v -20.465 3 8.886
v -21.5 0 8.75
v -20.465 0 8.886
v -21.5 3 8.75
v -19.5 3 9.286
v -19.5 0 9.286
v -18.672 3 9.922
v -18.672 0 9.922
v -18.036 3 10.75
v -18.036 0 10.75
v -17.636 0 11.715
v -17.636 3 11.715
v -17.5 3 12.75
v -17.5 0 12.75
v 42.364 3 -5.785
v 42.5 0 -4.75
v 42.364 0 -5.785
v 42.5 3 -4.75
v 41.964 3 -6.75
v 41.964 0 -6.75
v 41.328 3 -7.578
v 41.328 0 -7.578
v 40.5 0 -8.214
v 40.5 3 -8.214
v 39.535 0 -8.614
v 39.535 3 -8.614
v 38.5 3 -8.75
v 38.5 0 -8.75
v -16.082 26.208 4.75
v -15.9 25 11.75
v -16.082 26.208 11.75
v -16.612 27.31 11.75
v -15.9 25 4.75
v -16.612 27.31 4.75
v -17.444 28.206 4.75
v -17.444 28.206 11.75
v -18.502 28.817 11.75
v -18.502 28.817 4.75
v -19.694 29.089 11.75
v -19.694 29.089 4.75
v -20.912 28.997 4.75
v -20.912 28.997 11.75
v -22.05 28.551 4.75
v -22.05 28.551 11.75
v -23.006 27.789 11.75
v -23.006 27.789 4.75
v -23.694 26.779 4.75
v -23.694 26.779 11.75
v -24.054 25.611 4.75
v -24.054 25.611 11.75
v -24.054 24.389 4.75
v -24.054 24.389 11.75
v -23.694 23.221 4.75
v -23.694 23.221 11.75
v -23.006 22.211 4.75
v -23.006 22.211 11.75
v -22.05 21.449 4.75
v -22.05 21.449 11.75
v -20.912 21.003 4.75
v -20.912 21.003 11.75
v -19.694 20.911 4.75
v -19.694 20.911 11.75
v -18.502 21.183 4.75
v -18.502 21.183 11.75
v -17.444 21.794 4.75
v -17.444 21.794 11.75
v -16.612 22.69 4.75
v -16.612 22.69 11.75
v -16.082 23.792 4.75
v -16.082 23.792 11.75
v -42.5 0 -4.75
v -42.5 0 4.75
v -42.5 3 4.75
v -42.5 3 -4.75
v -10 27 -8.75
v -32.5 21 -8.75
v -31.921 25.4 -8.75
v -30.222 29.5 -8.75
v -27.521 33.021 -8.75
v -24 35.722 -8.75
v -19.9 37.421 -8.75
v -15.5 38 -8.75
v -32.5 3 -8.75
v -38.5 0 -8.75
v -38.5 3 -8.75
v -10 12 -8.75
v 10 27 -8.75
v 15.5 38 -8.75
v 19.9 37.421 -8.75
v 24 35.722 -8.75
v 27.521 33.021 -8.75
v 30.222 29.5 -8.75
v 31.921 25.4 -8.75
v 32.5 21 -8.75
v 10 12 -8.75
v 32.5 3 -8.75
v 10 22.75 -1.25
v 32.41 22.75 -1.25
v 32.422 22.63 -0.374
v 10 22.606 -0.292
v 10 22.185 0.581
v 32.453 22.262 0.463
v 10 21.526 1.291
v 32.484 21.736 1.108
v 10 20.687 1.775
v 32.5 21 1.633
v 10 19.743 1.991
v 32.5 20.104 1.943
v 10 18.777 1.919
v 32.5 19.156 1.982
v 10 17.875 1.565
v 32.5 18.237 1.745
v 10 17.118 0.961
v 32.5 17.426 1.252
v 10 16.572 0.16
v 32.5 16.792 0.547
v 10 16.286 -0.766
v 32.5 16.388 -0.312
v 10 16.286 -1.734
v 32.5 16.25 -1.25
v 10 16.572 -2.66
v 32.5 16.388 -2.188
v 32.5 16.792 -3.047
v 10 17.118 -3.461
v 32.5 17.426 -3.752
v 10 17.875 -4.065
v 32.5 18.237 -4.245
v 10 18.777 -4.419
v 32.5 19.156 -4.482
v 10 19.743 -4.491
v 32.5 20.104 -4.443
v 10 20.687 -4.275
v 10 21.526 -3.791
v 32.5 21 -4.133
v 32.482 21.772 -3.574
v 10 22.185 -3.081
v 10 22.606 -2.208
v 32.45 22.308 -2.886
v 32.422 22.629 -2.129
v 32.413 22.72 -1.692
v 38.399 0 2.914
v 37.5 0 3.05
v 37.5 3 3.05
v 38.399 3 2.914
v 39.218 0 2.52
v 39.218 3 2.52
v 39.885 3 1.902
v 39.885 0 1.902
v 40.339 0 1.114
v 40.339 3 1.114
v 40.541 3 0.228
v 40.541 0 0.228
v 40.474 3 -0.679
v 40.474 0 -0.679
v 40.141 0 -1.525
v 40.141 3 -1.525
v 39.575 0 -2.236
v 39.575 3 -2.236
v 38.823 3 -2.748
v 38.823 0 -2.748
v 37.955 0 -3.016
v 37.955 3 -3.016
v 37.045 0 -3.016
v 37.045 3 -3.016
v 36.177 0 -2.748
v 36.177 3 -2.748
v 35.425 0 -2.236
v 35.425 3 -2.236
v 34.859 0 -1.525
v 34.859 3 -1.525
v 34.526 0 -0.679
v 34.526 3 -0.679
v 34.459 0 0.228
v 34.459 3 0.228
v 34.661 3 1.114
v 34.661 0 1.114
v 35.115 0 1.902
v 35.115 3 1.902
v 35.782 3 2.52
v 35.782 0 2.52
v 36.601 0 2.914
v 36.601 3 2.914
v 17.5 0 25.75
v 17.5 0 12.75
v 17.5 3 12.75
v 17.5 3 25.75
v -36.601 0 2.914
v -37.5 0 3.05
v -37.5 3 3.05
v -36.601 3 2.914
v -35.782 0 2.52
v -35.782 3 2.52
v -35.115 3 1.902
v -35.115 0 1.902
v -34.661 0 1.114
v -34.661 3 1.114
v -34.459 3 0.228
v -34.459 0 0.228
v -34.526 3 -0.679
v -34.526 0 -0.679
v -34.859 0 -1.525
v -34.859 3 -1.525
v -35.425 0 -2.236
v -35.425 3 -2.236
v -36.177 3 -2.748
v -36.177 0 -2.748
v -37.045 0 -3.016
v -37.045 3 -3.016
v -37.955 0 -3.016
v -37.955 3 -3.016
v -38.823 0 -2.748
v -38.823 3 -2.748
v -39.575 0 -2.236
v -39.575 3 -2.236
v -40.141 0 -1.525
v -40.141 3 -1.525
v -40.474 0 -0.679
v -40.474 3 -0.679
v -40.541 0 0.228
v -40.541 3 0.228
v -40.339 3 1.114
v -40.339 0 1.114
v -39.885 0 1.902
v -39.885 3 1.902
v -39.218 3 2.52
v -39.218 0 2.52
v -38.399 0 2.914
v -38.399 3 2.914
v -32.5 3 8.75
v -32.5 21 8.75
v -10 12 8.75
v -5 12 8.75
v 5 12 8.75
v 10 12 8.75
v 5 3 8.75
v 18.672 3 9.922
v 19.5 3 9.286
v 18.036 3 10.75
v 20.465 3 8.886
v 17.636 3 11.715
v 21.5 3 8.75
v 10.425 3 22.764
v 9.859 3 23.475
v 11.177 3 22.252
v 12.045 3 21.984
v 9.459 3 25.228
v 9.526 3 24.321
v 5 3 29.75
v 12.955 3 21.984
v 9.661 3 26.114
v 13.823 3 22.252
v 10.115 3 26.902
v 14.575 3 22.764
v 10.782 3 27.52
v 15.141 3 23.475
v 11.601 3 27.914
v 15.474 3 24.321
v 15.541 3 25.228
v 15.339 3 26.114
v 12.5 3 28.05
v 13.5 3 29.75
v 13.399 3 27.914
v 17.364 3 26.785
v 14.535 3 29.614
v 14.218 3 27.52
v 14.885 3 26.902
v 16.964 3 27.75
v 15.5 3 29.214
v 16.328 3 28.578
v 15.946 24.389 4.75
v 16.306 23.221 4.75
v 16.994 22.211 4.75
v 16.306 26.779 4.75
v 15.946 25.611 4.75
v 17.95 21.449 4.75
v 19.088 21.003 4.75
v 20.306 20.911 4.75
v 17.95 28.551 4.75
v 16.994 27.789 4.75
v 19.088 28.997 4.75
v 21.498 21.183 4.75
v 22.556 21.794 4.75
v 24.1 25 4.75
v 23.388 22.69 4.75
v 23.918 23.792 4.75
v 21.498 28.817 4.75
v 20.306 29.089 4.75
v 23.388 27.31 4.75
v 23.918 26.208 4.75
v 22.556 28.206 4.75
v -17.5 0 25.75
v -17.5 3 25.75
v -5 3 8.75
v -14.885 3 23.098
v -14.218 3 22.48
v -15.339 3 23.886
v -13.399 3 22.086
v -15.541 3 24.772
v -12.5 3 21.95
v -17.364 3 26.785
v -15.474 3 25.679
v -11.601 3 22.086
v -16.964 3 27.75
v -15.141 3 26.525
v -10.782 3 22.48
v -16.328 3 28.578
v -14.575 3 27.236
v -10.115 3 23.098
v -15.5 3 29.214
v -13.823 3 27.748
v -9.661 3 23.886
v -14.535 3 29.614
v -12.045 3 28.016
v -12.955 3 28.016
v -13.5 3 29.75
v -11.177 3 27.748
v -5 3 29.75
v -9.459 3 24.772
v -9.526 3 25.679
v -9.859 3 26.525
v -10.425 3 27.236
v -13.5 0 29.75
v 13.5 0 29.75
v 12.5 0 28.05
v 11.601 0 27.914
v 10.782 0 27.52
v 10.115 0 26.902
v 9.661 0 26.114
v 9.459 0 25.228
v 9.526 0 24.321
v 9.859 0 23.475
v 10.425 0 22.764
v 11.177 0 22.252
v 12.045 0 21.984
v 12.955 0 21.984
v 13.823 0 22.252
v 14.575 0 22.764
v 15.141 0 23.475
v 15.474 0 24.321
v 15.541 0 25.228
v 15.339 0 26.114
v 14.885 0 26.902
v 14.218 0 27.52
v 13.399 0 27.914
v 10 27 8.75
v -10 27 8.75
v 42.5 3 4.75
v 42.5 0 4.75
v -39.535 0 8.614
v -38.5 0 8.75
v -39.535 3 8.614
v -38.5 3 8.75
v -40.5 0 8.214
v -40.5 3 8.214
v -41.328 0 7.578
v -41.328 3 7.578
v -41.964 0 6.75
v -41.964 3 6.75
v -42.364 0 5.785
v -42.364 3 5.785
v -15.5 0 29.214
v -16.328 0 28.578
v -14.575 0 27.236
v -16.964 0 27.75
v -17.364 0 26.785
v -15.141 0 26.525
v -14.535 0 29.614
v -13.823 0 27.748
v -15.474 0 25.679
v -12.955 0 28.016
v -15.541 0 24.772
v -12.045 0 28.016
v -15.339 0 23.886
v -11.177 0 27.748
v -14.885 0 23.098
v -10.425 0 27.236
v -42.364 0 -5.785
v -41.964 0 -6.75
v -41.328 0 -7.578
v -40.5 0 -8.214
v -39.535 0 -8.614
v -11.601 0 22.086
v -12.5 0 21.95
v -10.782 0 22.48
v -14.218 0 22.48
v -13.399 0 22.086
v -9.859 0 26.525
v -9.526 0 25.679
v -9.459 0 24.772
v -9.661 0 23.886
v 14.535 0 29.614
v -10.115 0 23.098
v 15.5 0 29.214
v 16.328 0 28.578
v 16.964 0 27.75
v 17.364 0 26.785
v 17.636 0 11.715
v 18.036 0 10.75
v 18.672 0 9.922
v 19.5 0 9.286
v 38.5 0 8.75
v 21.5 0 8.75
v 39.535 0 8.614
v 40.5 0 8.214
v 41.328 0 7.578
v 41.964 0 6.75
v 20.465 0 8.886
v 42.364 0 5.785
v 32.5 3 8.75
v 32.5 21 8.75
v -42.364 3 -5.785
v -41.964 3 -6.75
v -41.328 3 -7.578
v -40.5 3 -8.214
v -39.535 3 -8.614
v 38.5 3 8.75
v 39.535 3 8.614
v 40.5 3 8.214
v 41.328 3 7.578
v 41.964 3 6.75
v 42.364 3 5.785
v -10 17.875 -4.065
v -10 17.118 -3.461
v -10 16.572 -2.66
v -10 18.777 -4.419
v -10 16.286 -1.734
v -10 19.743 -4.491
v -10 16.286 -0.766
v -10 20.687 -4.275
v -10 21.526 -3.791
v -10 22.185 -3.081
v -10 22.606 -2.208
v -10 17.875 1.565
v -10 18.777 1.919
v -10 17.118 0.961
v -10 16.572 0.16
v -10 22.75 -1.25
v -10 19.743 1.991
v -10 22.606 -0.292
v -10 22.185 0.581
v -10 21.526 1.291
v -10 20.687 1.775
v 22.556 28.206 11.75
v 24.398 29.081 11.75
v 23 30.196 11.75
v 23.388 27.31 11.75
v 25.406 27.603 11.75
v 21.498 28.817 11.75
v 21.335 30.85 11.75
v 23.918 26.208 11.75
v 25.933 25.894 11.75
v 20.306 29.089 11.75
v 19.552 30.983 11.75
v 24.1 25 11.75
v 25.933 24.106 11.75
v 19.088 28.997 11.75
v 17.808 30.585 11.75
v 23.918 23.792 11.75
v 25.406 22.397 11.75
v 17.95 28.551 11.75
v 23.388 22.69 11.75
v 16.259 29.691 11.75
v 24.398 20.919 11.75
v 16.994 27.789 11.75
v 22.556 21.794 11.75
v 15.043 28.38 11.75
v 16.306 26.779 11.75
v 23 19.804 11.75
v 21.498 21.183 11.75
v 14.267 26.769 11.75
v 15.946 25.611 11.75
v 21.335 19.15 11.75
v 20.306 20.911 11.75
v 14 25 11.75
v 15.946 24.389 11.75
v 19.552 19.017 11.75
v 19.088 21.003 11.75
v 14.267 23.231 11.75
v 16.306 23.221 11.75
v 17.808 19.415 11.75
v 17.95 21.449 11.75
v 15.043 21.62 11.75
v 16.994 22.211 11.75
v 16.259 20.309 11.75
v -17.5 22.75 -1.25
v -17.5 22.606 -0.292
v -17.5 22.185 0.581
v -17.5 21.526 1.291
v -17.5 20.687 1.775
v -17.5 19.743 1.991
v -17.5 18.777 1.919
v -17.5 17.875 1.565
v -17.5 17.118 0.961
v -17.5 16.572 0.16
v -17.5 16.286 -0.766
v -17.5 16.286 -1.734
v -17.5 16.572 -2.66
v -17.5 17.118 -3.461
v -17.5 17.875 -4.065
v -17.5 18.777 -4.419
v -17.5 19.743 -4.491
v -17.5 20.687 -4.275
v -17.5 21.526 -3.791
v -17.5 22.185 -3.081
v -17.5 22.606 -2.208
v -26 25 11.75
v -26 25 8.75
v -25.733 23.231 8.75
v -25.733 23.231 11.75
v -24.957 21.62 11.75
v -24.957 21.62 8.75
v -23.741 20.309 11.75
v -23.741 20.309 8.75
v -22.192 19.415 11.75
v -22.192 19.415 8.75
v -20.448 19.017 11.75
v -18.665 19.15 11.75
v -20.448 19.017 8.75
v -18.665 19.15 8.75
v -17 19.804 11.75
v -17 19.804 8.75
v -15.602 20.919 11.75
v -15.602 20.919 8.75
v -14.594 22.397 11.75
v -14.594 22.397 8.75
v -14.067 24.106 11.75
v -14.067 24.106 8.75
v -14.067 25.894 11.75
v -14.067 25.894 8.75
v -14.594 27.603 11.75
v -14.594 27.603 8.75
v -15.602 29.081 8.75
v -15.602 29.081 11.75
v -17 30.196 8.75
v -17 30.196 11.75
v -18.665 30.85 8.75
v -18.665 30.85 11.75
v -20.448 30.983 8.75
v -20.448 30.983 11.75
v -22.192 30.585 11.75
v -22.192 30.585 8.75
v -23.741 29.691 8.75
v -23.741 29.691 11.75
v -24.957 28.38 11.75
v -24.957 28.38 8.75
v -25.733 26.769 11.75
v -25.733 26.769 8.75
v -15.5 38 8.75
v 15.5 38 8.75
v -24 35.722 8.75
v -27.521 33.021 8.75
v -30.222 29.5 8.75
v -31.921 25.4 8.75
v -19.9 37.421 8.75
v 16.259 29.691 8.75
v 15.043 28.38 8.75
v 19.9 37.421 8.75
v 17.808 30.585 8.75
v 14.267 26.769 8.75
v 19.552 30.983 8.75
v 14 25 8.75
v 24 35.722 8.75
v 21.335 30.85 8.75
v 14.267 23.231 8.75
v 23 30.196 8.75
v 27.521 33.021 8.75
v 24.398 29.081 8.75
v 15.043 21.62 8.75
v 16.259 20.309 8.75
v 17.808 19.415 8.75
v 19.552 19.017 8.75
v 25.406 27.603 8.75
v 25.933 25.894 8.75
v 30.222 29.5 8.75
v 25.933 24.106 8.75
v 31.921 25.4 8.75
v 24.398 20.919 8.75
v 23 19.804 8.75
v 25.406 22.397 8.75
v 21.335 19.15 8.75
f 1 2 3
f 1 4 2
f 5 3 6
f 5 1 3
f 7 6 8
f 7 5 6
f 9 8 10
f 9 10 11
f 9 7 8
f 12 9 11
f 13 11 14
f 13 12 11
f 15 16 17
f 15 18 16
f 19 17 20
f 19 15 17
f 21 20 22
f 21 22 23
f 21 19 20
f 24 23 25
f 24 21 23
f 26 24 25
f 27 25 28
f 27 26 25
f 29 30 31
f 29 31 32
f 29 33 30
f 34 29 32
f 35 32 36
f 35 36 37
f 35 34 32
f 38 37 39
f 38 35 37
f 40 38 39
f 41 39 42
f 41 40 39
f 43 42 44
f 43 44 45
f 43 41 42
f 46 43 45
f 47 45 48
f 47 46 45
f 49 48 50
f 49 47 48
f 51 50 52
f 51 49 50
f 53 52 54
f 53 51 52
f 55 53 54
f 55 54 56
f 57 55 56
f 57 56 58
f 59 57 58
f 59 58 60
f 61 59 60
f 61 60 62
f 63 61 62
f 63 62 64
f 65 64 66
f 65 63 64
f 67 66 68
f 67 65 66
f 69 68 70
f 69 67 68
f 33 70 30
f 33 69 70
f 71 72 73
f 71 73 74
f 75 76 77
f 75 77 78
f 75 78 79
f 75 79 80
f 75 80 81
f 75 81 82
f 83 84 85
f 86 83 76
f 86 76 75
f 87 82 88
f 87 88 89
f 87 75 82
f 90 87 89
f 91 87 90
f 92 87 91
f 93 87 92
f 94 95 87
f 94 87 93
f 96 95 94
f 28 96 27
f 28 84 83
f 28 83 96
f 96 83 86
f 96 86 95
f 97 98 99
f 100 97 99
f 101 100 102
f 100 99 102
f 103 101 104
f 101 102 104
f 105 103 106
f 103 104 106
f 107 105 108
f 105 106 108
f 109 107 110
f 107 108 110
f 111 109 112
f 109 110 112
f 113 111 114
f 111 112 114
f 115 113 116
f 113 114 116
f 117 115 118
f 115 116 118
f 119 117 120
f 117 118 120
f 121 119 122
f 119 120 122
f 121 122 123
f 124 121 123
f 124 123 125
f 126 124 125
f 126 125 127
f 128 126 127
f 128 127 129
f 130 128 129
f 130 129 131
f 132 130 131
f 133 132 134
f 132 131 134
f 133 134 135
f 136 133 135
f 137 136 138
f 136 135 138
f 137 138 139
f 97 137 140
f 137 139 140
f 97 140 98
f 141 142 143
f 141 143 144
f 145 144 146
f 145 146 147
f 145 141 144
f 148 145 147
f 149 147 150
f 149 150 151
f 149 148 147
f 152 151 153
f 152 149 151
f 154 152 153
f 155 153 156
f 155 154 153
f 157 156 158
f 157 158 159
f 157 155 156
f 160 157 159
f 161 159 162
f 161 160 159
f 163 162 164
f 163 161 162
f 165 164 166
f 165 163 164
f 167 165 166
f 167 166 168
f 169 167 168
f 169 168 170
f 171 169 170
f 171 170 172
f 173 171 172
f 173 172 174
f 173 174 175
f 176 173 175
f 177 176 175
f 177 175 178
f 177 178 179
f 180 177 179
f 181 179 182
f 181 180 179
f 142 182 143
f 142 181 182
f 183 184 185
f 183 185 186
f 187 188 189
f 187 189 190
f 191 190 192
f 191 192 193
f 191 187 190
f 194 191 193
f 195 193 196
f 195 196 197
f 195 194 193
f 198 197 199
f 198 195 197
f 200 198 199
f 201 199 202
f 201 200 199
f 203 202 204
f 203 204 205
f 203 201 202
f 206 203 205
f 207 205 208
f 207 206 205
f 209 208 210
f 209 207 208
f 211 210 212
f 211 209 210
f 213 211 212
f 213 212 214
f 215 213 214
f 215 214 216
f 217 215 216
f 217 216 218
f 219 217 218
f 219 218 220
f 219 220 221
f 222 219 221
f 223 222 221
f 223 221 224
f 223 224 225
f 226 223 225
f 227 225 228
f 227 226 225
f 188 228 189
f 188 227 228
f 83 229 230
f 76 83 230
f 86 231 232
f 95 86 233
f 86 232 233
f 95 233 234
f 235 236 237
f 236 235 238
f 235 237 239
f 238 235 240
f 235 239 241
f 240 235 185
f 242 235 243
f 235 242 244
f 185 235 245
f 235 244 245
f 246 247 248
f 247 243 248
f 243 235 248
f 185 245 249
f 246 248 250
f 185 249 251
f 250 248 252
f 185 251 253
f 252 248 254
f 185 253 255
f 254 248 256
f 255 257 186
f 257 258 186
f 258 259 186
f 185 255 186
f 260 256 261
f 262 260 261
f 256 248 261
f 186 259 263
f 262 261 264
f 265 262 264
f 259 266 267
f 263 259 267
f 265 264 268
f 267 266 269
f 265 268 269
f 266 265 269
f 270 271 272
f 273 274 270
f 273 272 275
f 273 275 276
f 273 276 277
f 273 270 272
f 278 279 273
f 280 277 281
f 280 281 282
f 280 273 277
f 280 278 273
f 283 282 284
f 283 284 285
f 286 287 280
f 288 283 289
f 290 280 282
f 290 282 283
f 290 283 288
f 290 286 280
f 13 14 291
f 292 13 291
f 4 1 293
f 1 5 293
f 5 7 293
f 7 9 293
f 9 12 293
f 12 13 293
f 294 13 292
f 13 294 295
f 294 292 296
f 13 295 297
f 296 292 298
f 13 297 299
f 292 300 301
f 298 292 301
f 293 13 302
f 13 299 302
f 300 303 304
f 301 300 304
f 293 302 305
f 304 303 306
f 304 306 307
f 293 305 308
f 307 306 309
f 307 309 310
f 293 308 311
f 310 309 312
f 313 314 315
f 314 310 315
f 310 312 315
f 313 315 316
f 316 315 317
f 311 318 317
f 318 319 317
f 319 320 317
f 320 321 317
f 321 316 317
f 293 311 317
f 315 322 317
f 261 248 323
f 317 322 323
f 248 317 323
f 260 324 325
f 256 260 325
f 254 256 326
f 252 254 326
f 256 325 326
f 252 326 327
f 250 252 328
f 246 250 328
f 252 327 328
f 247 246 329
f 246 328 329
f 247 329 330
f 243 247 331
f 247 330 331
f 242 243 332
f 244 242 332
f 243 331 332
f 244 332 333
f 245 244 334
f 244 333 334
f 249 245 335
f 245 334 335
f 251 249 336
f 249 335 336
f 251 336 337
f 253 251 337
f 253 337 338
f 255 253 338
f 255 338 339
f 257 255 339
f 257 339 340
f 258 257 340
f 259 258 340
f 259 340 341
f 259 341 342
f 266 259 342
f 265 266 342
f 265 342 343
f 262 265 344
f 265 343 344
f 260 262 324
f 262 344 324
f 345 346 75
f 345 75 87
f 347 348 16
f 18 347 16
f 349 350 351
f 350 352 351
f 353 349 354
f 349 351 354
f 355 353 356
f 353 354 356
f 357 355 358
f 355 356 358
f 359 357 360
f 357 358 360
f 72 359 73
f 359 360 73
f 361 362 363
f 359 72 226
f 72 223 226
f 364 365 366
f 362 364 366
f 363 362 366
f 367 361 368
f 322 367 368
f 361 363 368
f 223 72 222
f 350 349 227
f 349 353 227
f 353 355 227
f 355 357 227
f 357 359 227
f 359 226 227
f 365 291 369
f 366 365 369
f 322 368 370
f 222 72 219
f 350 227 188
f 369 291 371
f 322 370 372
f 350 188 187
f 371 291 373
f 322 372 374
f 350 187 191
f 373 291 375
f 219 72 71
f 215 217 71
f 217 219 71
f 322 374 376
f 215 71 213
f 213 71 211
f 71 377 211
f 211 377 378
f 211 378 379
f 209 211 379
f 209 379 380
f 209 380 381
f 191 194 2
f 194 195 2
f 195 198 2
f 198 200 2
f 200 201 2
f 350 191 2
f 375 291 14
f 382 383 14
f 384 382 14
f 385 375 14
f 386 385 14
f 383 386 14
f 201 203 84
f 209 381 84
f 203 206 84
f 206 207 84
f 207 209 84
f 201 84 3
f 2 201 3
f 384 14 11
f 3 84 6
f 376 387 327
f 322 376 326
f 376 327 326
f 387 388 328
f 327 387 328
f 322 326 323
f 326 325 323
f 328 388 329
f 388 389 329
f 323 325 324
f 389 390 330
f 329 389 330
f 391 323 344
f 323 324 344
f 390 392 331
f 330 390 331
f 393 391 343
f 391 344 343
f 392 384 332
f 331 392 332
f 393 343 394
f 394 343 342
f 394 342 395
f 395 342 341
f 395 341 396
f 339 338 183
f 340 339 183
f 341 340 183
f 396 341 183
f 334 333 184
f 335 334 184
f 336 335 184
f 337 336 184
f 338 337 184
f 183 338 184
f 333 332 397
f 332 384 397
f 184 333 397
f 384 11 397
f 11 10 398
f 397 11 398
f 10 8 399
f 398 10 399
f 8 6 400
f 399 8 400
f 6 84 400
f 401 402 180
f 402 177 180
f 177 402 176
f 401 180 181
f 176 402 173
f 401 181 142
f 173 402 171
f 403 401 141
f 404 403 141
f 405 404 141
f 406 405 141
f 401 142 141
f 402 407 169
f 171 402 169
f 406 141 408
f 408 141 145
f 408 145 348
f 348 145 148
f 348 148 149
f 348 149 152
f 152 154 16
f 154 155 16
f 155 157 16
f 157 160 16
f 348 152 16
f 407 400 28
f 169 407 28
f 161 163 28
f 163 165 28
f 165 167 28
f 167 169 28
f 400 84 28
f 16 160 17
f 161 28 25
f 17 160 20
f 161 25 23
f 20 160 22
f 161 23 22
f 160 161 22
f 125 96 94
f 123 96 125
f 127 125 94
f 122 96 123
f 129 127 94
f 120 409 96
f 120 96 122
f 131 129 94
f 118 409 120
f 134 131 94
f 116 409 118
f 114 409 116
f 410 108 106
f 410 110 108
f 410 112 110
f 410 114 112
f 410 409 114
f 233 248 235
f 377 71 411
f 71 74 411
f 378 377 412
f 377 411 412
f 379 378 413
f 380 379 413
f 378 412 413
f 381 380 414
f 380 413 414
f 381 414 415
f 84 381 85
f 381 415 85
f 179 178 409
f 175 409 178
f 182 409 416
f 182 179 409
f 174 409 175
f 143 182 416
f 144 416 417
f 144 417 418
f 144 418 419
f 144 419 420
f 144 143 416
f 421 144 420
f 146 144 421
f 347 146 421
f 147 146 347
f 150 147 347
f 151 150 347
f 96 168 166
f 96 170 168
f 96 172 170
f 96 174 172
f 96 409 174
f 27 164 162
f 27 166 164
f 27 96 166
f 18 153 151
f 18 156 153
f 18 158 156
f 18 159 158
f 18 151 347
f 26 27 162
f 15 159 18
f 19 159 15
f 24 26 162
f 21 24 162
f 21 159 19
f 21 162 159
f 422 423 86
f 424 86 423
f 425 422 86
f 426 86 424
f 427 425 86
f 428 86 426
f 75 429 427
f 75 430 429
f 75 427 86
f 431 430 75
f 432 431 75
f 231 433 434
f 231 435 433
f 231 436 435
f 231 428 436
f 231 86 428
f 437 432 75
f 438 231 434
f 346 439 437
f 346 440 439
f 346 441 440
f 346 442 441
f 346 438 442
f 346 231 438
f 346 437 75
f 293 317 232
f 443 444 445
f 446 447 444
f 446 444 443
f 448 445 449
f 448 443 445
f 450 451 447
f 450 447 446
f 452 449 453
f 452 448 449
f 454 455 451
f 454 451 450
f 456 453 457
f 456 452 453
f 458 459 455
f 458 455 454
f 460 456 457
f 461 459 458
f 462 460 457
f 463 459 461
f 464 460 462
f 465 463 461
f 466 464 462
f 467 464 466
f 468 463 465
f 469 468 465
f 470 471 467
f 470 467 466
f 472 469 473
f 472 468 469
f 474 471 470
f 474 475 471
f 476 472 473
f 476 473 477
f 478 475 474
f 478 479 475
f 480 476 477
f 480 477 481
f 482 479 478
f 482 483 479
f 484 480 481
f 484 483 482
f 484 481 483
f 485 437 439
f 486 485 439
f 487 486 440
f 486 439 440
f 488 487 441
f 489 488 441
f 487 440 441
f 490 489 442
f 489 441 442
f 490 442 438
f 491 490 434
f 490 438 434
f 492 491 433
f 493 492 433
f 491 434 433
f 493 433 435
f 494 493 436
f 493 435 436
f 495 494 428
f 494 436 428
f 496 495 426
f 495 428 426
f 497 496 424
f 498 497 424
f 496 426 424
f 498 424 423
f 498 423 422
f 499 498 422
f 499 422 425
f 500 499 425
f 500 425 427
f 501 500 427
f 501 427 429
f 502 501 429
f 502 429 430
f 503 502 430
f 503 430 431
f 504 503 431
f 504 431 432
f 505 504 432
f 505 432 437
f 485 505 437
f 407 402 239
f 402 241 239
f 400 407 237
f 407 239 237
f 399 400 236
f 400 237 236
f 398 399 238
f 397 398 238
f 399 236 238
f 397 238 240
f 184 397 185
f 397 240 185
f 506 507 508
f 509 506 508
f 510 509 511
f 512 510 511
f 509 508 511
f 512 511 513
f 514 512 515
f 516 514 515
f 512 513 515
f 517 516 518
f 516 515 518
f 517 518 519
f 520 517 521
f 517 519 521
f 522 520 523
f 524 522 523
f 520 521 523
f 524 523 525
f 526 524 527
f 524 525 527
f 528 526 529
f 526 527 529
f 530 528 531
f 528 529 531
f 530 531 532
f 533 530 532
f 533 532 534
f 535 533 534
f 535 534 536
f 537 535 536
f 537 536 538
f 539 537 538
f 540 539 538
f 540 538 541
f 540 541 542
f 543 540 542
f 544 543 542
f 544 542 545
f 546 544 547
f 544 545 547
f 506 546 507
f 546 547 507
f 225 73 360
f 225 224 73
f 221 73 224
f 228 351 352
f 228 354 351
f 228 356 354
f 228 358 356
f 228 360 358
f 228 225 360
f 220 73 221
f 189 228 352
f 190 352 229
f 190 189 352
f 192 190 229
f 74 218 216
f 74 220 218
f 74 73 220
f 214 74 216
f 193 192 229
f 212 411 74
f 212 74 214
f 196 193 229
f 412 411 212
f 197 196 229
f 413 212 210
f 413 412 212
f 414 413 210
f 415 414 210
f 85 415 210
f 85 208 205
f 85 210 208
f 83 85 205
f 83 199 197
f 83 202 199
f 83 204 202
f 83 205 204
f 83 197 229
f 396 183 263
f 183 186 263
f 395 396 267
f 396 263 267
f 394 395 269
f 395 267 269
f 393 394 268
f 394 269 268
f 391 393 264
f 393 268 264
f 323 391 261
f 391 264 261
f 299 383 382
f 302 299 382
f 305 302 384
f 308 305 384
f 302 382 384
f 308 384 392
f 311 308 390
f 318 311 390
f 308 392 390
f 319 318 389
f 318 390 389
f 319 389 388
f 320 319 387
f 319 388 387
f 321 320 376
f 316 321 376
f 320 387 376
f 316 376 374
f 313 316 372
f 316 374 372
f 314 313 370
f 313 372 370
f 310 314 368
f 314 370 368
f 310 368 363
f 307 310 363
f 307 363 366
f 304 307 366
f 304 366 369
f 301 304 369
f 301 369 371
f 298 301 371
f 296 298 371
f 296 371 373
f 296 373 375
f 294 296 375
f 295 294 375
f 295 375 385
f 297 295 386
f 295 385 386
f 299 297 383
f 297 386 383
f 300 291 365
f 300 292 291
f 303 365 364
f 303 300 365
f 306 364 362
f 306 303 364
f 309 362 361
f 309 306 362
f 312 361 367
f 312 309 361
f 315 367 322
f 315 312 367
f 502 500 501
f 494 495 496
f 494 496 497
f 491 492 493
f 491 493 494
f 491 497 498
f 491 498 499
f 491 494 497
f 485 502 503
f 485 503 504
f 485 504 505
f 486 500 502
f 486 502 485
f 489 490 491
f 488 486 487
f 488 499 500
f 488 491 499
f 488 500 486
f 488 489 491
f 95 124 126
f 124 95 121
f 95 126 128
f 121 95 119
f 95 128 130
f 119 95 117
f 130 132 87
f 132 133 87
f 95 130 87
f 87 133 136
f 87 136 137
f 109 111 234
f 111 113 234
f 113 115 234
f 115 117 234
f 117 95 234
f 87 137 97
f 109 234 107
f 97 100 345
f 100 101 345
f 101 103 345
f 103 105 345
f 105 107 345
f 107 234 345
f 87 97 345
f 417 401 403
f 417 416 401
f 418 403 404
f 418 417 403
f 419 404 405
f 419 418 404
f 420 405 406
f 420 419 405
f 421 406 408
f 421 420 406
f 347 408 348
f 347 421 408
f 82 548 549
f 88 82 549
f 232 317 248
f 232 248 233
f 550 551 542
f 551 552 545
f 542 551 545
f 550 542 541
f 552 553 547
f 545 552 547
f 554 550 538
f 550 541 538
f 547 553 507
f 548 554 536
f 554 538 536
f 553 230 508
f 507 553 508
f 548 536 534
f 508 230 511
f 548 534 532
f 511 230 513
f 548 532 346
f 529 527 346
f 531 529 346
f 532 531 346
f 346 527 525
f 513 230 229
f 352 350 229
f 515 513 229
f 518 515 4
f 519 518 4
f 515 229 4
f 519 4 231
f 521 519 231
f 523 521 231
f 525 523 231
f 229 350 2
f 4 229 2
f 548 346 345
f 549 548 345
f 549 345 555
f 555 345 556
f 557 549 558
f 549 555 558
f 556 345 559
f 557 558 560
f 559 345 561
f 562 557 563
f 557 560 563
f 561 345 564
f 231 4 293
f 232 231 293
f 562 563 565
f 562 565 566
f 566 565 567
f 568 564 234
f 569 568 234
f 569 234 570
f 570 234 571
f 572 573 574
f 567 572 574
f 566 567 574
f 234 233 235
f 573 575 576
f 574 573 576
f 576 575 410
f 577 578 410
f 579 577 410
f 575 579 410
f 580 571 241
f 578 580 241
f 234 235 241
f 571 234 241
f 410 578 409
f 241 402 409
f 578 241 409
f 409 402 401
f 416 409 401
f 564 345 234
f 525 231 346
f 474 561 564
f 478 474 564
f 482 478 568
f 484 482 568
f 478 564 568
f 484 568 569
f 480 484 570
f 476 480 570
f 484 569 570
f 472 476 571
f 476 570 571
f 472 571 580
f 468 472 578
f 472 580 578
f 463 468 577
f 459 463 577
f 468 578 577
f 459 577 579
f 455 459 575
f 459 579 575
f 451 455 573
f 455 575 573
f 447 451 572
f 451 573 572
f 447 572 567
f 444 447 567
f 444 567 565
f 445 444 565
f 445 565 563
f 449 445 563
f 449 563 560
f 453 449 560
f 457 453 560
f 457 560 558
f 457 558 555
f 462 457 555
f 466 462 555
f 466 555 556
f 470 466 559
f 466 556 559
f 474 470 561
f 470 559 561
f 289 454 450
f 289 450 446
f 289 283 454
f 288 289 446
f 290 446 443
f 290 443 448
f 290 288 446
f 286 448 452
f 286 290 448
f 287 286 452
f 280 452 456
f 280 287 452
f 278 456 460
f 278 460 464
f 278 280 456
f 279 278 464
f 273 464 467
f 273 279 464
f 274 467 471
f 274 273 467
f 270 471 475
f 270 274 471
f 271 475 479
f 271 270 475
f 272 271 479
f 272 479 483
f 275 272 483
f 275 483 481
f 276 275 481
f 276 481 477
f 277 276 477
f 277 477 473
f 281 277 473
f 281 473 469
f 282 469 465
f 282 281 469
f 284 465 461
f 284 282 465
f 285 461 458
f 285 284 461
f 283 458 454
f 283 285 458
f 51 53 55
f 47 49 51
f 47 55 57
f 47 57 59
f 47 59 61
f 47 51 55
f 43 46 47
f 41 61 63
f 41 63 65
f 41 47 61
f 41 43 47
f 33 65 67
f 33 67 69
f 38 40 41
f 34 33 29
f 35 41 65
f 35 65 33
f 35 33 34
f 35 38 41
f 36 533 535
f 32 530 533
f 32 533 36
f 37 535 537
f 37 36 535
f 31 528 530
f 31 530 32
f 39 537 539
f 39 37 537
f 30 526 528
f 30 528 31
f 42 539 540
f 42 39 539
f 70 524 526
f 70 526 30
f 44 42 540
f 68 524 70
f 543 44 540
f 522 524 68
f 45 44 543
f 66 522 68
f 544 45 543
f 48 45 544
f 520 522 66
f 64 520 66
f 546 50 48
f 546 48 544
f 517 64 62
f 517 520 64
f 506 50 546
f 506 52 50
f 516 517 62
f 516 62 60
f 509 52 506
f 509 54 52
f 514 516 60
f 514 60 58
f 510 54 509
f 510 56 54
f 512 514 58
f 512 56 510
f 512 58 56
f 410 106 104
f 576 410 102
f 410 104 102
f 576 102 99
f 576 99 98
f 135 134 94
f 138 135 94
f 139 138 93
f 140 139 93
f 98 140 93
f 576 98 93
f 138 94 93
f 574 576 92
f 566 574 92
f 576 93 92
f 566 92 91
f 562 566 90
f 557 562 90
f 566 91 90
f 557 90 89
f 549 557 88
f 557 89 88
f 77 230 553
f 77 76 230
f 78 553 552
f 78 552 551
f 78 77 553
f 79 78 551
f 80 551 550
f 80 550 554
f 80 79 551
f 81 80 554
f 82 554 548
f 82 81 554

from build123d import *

# Parameters (mm, degrees)
SKICA1_W                 = 85
SKICA1_H                 = 17.5
SKICA1_R                 = 3.05
P_IDAT_VYSUNUT_M1_DEPTH  = 3
SKICA3_W                 = 65
SKICA3_H                 = 35
P_IDAT_VYSUNUT_M2_DEPTH  = 17.5
ZAOBLIT2_R               = 17
SKICA4_R                 = 6
SKICA4_R_2               = 4.1
P_IDAT_VYSUNUT_M3_DEPTH  = 3
ODEBRAT_START            = -4
SKICA4_2_R               = 4.1
ODEBRAT_VYSUNUT_M1_DEPTH = 4
SKICA5_W                 = 20
SKICA5_H                 = 15
ODEBRAT_VYSUNUT_M2_DEPTH = 60.636398282
SKICA7_R                 = 3.25
ODEBRAT_VYSUNUT_M4_DEPTH = 50
SKICA8_W                 = 35
SKICA8_H                 = 21
SKICA8_R                 = 3.05
P_IDAT_VYSUNUT_M4_DEPTH  = 3
ZAOBLIT1_R               = 4
EBRO4_REACH              = 66.306
SKICA12_WALL_W           = 153.460110402
SKICA12_WALL_H           = 10


with BuildPart() as part:
    # Skica1 → P_idat vysunut_m1 (new body)
    with BuildSketch(Plane(origin=(0, 0, 0), x_dir=(1, 0, 0), z_dir=(0, 1, 0))):
        Rectangle(SKICA1_W, SKICA1_H)
        with Locations((-37.5, 0)):
            Circle(SKICA1_R, mode=Mode.SUBTRACT)
        with Locations((37.5, 0)):
            Circle(SKICA1_R, mode=Mode.SUBTRACT)
    extrude(amount=P_IDAT_VYSUNUT_M1_DEPTH)

    # Skica3 → P_idat vysunut_m2 (add)
    with BuildSketch(Plane.XY.offset(8.75)):
        with Locations((0, 20.5)):
            Rectangle(SKICA3_W, SKICA3_H)
    extrude(amount=-P_IDAT_VYSUNUT_M2_DEPTH)

    # Zaoblit2
    zaoblit2_edges = [part.edges().sort_by_distance(p)[0] for p in [
        (-32.5, 38, 0),
        (32.5, 38, 0),
    ]]
    fillet(zaoblit2_edges, radius=ZAOBLIT2_R)

    # Skica4 → P_idat vysunut_m3 (add)
    # profile 1 of 2: a face of its own
    with BuildSketch(Plane.XY.offset(8.75)):
        with Locations((-20, 25)):
            Circle(SKICA4_R)
        with Locations((-20, 25)):
            Circle(SKICA4_R_2, mode=Mode.SUBTRACT)
    # profile 2 of 2: a face of its own
    with BuildSketch(Plane.XY.offset(8.75)):
        with Locations((20, 25)):
            Circle(SKICA4_R)
        with Locations((20, 25)):
            Circle(SKICA4_R_2, mode=Mode.SUBTRACT)
    extrude(amount=P_IDAT_VYSUNUT_M3_DEPTH)

    # Skica4_2 → Odebrat vysunut_m1 (cut)
    with BuildSketch(Plane.XY.offset(8.75).offset(ODEBRAT_START)):
        with Locations((-20, 25)):
            Circle(SKICA4_2_R)
        with Locations((20, 25)):
            Circle(SKICA4_2_R)
    extrude(amount=ODEBRAT_VYSUNUT_M1_DEPTH, mode=Mode.SUBTRACT)

    # Skica5 → Odebrat vysunut_m2 (cut, through all)
    with BuildSketch(Plane.XY.offset(8.75)):
        with Locations((0, 19.5)):
            Rectangle(SKICA5_W, SKICA5_H)
    extrude(amount=-ODEBRAT_VYSUNUT_M2_DEPTH, mode=Mode.SUBTRACT)

    # Skica7 → Odebrat vysunut_m4 (cut)
    with BuildSketch(Plane(origin=(32.5, 0, 0), x_dir=(0, 0, -1), z_dir=(1, 0, 0))):
        with Locations((1.25, 19.5)):
            Circle(SKICA7_R)
    extrude(amount=-ODEBRAT_VYSUNUT_M4_DEPTH, mode=Mode.SUBTRACT)

    # Skica8 → P_idat vysunut_m4 (add)
    with BuildSketch(Plane.XZ):
        with Locations((0, 19.25)):
            Rectangle(SKICA8_W, SKICA8_H)
        with Locations((-12.5, 25)):
            Circle(SKICA8_R, mode=Mode.SUBTRACT)
        with Locations((12.5, 25)):
            Circle(SKICA8_R, mode=Mode.SUBTRACT)
    extrude(amount=-P_IDAT_VYSUNUT_M4_DEPTH)

    # Zaoblit1
    zaoblit1_edges = [part.edges().sort_by_distance(p)[0] for p in [
        (42.5, 1.5, 8.75),
        (42.5, 1.5, -8.75),
        (-42.5, 1.5, -8.75),
        (-42.5, 1.5, 8.75),
        (17.5, 1.5, 8.75),
        (-17.5, 1.5, 8.75),
        (-17.5, 1.5, 29.75),
        (17.5, 1.5, 29.75),
    ]]
    fillet(zaoblit1_edges, radius=ZAOBLIT1_R)

    # Skica12 wall → ebro4 (add, up to next)
    with BuildSketch(Plane(origin=(0, 7.5, 19.25), x_dir=(0, 0.393919298579, -0.919145030018), z_dir=(0, 0.919145030018, 0.393919298579)), mode=Mode.PRIVATE) as ebro4_sk1:
        Rectangle(SKICA12_WALL_W, SKICA12_WALL_H)
    ebro4_tool1 = extrude(ebro4_sk1.sketch, amount=-EBRO4_REACH, mode=Mode.PRIVATE) - part.part
    add(ebro4_tool1.solids().sort_by_distance((0, 7.5, 19.25))[0])


solid = part.part
